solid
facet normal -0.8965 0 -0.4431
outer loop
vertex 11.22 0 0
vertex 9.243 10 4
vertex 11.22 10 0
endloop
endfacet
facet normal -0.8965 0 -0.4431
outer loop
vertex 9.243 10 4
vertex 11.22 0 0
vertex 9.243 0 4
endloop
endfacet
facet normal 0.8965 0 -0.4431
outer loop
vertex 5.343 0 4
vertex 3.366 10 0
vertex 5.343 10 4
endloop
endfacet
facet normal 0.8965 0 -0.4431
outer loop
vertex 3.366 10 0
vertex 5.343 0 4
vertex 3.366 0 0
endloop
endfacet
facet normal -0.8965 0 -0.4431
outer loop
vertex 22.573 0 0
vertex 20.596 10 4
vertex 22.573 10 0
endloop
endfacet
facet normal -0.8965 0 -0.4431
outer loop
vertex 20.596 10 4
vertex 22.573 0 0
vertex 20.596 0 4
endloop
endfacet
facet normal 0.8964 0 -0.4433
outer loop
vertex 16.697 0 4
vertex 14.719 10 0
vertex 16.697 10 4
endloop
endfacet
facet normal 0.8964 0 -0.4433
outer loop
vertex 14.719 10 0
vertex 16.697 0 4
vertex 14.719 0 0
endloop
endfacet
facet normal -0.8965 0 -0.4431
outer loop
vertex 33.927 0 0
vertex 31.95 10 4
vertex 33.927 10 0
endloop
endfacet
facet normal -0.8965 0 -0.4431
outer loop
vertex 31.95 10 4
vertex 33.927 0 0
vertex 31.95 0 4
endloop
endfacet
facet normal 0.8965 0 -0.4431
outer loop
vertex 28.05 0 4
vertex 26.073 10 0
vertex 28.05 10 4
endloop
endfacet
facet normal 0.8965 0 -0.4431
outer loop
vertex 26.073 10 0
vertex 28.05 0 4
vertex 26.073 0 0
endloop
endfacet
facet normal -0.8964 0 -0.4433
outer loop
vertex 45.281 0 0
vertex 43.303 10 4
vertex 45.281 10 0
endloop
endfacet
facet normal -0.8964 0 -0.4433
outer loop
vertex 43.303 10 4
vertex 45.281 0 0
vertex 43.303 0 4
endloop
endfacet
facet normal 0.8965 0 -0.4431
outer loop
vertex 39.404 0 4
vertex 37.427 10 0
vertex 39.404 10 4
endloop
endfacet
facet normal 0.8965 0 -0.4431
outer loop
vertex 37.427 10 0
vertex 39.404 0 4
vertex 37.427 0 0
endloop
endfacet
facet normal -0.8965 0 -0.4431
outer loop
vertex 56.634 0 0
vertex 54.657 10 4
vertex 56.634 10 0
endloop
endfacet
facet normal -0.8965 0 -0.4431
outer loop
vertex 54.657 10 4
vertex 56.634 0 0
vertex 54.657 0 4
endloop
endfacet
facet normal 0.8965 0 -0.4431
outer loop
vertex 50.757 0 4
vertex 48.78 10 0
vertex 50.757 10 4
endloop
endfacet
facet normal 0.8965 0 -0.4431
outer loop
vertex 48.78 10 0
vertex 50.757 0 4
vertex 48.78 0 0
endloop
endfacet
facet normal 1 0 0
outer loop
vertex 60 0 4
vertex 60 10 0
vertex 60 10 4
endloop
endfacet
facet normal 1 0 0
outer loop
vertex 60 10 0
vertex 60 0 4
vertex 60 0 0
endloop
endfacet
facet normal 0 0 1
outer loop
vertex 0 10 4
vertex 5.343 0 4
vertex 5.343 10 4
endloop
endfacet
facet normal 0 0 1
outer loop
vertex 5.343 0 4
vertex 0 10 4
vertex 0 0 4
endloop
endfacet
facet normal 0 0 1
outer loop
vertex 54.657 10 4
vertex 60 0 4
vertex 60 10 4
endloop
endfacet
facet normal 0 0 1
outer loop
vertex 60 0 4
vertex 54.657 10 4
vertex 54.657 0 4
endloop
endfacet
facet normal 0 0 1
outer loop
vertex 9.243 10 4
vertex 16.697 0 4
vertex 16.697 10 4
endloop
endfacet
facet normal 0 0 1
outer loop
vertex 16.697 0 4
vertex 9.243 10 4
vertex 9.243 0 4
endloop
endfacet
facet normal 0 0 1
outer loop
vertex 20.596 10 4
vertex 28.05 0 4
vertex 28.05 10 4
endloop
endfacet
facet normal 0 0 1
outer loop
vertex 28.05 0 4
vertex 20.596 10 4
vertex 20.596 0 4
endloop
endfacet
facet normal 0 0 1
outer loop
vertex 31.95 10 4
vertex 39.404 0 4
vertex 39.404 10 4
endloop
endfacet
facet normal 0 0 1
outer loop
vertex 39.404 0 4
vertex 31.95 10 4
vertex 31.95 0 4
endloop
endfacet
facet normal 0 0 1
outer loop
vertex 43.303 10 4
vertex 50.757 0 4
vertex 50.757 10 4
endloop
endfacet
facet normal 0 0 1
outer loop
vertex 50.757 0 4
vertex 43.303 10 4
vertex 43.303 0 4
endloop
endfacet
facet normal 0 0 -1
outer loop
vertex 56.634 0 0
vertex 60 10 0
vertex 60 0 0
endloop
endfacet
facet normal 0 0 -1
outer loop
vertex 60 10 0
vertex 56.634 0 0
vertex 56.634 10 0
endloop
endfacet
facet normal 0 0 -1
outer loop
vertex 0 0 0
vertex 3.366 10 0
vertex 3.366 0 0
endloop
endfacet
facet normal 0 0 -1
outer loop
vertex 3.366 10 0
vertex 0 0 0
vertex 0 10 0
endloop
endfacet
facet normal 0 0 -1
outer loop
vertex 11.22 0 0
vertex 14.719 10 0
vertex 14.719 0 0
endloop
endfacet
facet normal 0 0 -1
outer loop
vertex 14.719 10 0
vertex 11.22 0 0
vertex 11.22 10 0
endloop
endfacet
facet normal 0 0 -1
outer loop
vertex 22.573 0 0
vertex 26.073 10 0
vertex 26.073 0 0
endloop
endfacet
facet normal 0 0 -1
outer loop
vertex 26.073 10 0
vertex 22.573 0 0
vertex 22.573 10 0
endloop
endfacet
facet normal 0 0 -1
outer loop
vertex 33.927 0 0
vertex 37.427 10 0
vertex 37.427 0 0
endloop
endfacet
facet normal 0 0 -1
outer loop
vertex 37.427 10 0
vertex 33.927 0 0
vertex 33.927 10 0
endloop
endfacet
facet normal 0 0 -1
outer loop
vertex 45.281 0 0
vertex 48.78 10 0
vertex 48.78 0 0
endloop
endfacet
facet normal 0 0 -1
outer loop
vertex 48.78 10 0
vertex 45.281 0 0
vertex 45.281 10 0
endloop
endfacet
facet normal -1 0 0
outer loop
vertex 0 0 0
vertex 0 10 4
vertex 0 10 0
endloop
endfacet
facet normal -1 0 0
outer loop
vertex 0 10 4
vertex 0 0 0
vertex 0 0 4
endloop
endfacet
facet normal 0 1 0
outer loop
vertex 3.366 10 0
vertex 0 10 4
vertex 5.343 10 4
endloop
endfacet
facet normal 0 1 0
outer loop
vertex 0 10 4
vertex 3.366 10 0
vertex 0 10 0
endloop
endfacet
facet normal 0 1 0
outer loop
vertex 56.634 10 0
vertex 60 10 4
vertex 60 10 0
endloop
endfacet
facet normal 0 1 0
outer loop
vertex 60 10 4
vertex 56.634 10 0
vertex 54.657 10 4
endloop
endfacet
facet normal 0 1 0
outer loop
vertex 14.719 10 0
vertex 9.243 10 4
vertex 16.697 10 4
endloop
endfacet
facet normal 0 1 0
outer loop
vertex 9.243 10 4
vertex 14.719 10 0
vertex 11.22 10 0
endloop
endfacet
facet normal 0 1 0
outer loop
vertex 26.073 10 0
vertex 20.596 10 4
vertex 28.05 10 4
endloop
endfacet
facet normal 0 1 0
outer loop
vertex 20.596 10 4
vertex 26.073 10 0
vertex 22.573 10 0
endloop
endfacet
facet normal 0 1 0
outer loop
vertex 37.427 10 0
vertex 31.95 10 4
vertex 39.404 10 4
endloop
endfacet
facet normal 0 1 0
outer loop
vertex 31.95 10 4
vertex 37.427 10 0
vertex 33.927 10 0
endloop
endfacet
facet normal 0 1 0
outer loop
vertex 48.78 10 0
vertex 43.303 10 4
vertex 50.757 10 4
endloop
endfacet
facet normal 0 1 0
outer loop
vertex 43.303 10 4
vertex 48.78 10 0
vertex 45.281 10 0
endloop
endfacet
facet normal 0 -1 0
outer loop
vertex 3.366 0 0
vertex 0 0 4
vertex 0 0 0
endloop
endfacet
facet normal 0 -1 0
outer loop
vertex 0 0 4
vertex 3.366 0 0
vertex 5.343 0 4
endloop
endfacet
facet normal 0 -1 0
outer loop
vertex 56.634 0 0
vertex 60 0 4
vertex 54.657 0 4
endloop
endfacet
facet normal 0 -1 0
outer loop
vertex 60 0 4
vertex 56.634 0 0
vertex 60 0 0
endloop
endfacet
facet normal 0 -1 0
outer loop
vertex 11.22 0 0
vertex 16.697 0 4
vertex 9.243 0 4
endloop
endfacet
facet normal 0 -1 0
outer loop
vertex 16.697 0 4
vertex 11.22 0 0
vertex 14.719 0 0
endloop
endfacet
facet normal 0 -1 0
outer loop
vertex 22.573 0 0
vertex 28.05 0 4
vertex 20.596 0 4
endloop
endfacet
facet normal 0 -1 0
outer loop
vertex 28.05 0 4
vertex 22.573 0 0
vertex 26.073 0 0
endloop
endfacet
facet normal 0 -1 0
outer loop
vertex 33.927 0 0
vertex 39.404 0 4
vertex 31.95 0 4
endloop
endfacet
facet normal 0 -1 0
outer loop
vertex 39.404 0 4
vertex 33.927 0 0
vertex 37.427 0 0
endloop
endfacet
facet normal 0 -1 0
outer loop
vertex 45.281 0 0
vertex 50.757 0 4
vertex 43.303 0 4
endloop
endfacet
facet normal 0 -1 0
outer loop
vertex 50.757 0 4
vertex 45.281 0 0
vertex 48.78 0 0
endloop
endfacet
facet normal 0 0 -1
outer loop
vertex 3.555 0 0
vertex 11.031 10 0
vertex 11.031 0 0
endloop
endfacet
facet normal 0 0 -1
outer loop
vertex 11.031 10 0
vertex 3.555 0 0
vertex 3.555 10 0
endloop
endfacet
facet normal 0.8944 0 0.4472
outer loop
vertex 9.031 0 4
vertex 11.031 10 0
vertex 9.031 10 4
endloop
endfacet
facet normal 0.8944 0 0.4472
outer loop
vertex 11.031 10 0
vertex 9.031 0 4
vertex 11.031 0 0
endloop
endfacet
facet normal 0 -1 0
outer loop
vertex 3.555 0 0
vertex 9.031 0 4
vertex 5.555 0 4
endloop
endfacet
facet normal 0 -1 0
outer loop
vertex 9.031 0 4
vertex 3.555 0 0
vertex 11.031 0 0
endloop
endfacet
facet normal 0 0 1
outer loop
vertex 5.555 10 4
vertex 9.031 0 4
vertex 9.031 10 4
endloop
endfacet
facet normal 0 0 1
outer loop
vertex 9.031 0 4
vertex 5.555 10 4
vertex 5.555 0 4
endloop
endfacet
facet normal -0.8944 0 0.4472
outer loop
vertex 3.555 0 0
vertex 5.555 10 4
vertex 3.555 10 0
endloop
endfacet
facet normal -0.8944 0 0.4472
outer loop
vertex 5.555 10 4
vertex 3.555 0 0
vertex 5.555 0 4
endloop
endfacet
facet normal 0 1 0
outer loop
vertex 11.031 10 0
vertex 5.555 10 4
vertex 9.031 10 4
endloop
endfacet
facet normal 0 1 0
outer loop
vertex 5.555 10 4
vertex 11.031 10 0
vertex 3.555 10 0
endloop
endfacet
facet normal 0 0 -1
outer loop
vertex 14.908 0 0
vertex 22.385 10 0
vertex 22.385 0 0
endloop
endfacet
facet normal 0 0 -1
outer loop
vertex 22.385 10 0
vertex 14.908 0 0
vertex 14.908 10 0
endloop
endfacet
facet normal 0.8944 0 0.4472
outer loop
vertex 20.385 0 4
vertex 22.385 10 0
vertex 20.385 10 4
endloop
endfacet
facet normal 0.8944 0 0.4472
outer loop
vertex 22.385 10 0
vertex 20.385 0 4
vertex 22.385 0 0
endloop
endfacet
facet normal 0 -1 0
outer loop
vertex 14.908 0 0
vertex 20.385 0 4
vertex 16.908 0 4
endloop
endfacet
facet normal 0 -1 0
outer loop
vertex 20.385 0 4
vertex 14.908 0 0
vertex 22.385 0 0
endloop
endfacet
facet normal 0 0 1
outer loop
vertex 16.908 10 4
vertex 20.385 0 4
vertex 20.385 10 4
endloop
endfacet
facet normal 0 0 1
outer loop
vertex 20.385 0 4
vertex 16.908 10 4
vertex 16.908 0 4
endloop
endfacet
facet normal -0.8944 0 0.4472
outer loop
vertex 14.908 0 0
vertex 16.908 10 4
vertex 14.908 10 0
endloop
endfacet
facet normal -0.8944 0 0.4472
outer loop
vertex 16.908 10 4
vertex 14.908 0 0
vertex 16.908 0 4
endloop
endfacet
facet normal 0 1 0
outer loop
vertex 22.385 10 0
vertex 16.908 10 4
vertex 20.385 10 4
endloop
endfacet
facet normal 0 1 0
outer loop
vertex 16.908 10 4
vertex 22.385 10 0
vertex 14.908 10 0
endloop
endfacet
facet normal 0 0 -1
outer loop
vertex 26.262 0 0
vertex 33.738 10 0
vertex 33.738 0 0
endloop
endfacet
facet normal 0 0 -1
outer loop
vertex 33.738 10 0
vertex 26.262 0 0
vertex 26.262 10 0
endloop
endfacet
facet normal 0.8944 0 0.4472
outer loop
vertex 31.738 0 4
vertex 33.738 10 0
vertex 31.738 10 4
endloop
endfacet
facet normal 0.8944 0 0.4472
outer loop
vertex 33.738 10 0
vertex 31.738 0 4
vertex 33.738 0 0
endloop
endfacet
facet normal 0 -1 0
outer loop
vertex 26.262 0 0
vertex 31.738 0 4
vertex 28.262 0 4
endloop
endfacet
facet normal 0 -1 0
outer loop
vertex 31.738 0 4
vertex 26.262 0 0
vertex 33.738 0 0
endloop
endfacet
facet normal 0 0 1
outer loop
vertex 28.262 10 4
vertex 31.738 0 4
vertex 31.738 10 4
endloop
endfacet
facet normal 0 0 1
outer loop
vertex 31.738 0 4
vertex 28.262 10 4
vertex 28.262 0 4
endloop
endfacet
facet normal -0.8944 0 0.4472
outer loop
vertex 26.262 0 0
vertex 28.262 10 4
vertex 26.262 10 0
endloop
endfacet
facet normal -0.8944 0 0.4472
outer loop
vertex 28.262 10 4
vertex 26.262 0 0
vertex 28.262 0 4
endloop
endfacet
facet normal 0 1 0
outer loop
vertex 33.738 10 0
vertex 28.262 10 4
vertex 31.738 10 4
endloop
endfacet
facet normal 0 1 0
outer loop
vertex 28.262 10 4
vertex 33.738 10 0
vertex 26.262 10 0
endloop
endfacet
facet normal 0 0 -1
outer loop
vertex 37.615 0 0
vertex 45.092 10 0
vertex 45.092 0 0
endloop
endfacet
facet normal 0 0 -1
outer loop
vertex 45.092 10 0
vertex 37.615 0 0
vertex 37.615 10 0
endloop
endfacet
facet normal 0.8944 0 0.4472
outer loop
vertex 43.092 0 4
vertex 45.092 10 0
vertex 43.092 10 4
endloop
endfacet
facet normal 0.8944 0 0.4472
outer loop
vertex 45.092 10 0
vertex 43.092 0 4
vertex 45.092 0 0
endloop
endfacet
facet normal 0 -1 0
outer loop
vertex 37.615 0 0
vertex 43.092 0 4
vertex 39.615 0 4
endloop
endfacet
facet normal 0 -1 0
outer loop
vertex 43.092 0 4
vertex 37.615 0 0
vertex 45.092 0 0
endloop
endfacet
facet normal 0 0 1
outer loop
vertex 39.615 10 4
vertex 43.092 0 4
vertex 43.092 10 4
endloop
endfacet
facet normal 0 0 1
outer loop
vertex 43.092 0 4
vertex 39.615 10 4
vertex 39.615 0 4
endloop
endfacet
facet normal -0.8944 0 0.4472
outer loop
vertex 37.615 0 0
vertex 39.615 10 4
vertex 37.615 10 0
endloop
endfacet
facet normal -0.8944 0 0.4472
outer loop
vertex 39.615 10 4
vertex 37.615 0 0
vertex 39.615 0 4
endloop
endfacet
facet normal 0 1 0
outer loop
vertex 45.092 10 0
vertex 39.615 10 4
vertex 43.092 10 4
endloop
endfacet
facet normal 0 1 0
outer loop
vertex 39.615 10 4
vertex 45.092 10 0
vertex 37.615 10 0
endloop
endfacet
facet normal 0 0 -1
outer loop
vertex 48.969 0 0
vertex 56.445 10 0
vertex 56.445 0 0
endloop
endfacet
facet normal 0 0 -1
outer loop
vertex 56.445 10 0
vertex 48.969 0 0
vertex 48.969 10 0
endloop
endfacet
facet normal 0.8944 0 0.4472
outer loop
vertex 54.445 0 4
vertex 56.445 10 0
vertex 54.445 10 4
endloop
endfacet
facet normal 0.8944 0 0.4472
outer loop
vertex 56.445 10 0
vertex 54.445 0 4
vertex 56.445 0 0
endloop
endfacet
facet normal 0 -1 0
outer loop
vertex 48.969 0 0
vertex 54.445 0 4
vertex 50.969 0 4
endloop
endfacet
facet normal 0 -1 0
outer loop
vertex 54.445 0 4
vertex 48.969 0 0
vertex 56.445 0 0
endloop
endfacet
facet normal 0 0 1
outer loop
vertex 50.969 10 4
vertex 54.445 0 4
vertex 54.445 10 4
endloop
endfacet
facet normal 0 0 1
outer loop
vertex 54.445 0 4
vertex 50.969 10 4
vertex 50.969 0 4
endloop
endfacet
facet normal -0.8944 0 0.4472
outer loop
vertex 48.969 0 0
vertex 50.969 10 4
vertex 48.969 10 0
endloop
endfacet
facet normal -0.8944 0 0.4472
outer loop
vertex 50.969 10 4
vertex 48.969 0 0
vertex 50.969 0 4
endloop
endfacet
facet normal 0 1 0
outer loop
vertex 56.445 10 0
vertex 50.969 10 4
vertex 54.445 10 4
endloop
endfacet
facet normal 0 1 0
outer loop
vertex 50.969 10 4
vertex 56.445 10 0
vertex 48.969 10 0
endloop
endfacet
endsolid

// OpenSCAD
// file: basic_shapes.scad
include <values.scad>;

module hole_array(xs, diameter, height, y = 0, z = 0, square = false) {
    for (x = xs) {
        translate([x, y, z]) {
            if (square) {
                translate([diameter / -2, diameter / -2, 0]) {
                    cube([diameter, diameter, height]);
                }
            } else {
                cylinder(d = diameter, h = height);
            }
        }
    }
}

module spacer_array(
    positions,
    height,
    wall = 2,
    hole_diameter = PCB_MOUNT_HOLE_DIAMETER,
    z = 0,
    $fn = DEFAULT_ROUNDING
) {
    for (position = positions) {
        translate([position.x, position.y, z]) {
            ring(
                diameter = hole_diameter + wall * 2,
                inner_diameter = hole_diameter,
                height = height
            );
        }
    }
}

module flat_top_rectangular_pyramid(
    top_width = 0,
    top_length = 0,

    bottom_width = 0,
    bottom_length = 0,

    height = 0,

    top_x = undef,
    top_y = undef,

    top_weight_x = .5,
    top_weight_y = .5
) {
    top_x = top_x != undef
        ? top_x
        : (bottom_width - top_width) * top_weight_x;
    top_y = top_y != undef
        ? top_y
        : (bottom_length - top_length) * top_weight_y;

    max_difference = max(bottom_width - top_width, bottom_length - top_length);
    height = height == undef
        ? max_difference / 2
        : height;

    polyhedron(
        [
            [0, 0, 0],
            [bottom_width, 0, 0],
            [bottom_width, bottom_length, 0],
            [0, bottom_length, 0],
            [top_x, top_y, height],
            [top_width + top_x, top_y, height],
            [top_width + top_x, top_length + top_y, height],
            [top_x, top_length + top_y, height]
        ], [
            [0, 1, 2, 3],
            [4, 5, 1, 0],
            [7, 6, 5, 4],
            [5, 6, 2, 1],
            [6, 7, 3, 2],
            [7, 4, 0, 3]
        ]
    );
}

module rounded_cube(dimensions, radius, $fn = $fn) {
    positions = [
        [radius, radius, radius],
        [dimensions.x - radius, radius, radius],
        [dimensions.x - radius, dimensions.y - radius, radius],
        [radius, dimensions.y - radius, radius],
        [radius, radius, dimensions.z - radius],
        [dimensions.x - radius, radius, dimensions.z - radius],
        [dimensions.x - radius, dimensions.y - radius, dimensions.z - radius],
        [radius, dimensions.y - radius, dimensions.z - radius],
    ];

    if (radius > 0) {
        hull() {
            for (position = positions) {
                translate(position) sphere(r = radius);
            }
        }
    } else {
        cube(dimensions);
    }
}

module support_wall(
    dimensions,
    is_back = true,
    railing_diameter = 3.5,
    support_width = 2,
    support_length = 4,
    gutter = 4
) {
    railing_z = railing_diameter / 4;

    module _support(height = dimensions[2], depth = support_length) {
        translate([0, -depth, 0]) {
            flat_top_rectangular_pyramid(
                top_width = support_width,
                top_length = 0,
                bottom_width = support_width,
                bottom_length = support_length,
                height = height,
                top_weight_y = 1
            );
        }
    }

    translate(is_back ? [0, dimensions[1], 0] : [0, 0, 0]) {
        mirror(is_back ? [0, 1, 0] : [0, 0, 0]) {
            cube(dimensions);

            translate([0, dimensions[1] / 2, dimensions[2] + railing_z]) {
                rotate([0, 90, 0]) {
                    cylinder(
                        d = railing_diameter,
                        h = dimensions[0],
                        $fn = 9
                    );
                }
            }

            translate([gutter, 0, 0]) {
                _support();
            }
            translate([dimensions[0] - support_length - gutter, 0, 0]) {
                _support();
            }
        }
    }
}

module ring(
    diameter,
    height,
    thickness, inner_diameter = 0
) {
    e = 0.034;
    thickness = thickness != undef
        ? thickness
        : (diameter - inner_diameter) / 2;

    difference() {
        cylinder(d = diameter, h = height);

        translate([0, 0, -e]) {
            cylinder(d = diameter - thickness * 2, h = height + e * 2);
        }
    }
}

module cylinder_grip(
    diameter,
    height,
    count,
    rotation_offset = 0,
    size = 1,
    $fn = undef
) {
    if (size > 0) {
        count = count != undef
            ? count
            : floor((diameter * PI) / size / 2);

        for (i = [0 : count - 1]) {
            rotate([0, 0, rotation_offset + 360 * i / count]) {
                translate([0, diameter / 2, 0]) {
                    cylinder(d = size, h = height);
                }
            }
        }
    }
}

module rounded_corner_cutoff(height, radius, angle = 0, e = 1.123, $fn = $fn) {
    difference() {
        rotate([0, 0, angle]) {
            cube([radius + e, radius + e, height]);
        }

        translate([0, 0, -e]) {
            cylinder(r = radius, h = height + e * 2);
        }
    }
}

rounded_corner_cutoff(height = 15, radius = 5);
// file: values.scad
DEFAULT_ROUNDING = 24;
HIDEF_ROUNDING = 120;

SACRIFICIAL_BRIDGE_HEIGHT = .2;
BREAKAWAY_SUPPORT_DEPTH = .5;
BREAKAWAY_SUPPORT_GUTTER = 1;
BREAKAWAY_SUPPORT_DISTANCE = 10;

PCB_WIDTH = 183.954;
PCB_LENGTH = 114.808;
PCB_HEIGHT = 1.6;
PCB_MOUNT_HOLE_DIAMETER = 3.2;

PCB_BATTERY_CAVITY_X = 135.382;
PCB_BATTERY_CAVITY_Y = 48.768;
PCB_BATTERY_CAVITY_LENGTH = PCB_LENGTH - PCB_BATTERY_CAVITY_Y + 1;

PCB_COMPONENTS_X = 2.54;
PCB_COMPONENTS_Y = 28.448;
PCB_COMPONENTS_WIDTH = PCB_BATTERY_CAVITY_X - PCB_COMPONENTS_X - 2.54 * 2;
PCB_COMPONENTS_LENGTH = PCB_LENGTH - PCB_COMPONENTS_Y - 2.54;
PCB_COMPONENTS_HEIGHT = 12;

PCB_SWITCH_X = 168.402;
PCB_SWITCH_Y = 8.636;

PCB_LED_X = 160.02 - 2.54 / 2;
PCB_LED_Y = 31.242;

PCB_VOLUME_WHEEL_X = 182.118 - 2.54;
PCB_VOLUME_WHEEL_Y = 34.29 + 2.54;

BUTTON_DIAMETER = 6;
BUTTON_LENGTH = 6.6;
BUTTON_WIDTH = 4.5;
BUTTON_HEIGHT = 6;

POT_HEIGHT = 7.8;

BOTTOM_MOUNTED_PCB_HOLES = [
    [175.804, 22.606],
    [8.164, 22.606],
    [64.044, 22.606],
    [119.924, 22.606],
];

BACK_PCB_HOLES = [
    [26.416, 92.964],
    [108.712, 92.964],
];

WIRE_RELIEF_HOLES = [
    [172.466, 44.704],
    [164.338, 44.704],
];

PCB_HOLES = concat(
    BOTTOM_MOUNTED_PCB_HOLES,
    BACK_PCB_HOLES,
    WIRE_RELIEF_HOLES
);

PCB_BUTTONS = [
    [10.414, 8.89 - BUTTON_LENGTH],
    [18.034, 13.97 - BUTTON_LENGTH],
    [25.654, 8.89 - BUTTON_LENGTH],
    [33.274, 13.97 - BUTTON_LENGTH],
    [40.894, 8.89 - BUTTON_LENGTH],
    [48.514, 13.97 - BUTTON_LENGTH],
    [56.134, 8.89 - BUTTON_LENGTH],
    [71.374, 8.89 - BUTTON_LENGTH],
    [78.994, 13.97 - BUTTON_LENGTH],
    [86.614, 8.89 - BUTTON_LENGTH],
    [94.234, 13.97 - BUTTON_LENGTH],
    [101.854, 8.89 - BUTTON_LENGTH],
    [117.094, 8.89 - BUTTON_LENGTH],
    [124.714, 13.97 - BUTTON_LENGTH],
    [132.334, 8.89 - BUTTON_LENGTH],
    [139.954, 13.97 - BUTTON_LENGTH],
    [147.574, 8.89 - BUTTON_LENGTH],
    [155.194, 13.97 - BUTTON_LENGTH],
    [162.814, 8.89 - BUTTON_LENGTH],
    [178.054, 8.89 - BUTTON_LENGTH],
];

SCREW_HEAD_DIAMETER = 6;
SCREW_HEAD_HEIGHT = 2.1;
NUT_DIAMETER = 6.4;
NUT_HEIGHT = 2.4;

DEFAULT_NUT_LOCK_HEIGHT_CLEARANCE = .1;
DEFAULT_NUT_LOCK_DIAMETER_CLEARANCE = .1;

MOUNT_STILT_MINIMUM_HEIGHT = NUT_HEIGHT + .5 + 2; // TODO: tidy against mount_stilt args

NATURAL_KEY_SEQUENCES = [
    [1,0,1,0,1,1,0,1,0,1,0,1,],
    [0,1,0,1,1,0,1,0,1,0,1,1,],
    [1,0,1,1,0,1,0,1,0,1,1,0,],
    [0,1,1,0,1,0,1,0,1,1,0,1,],
    [1,1,0,1,0,1,0,1,1,0,1,0,],
    [1,0,1,0,1,0,1,1,0,1,0,1,],
    [0,1,0,1,0,1,1,0,1,0,1,1,],
    [1,0,1,0,1,1,0,1,0,1,1,0,],
    [0,1,0,1,1,0,1,0,1,1,0,1,],
    [1,0,1,1,0,1,0,1,1,0,1,0,],
    [0,1,1,0,1,0,1,1,0,1,0,1,],
    [1,1,0,1,0,1,1,0,1,0,1,0,],
];

HINGE_CLASP_DEFAULT_PIN_DIAMETER = 1.75; // filament diameter
HINGE_CLASP_DEFAULT_MINIMAL_SUPPORT = 1.5;
HINGE_CLASP_MINIMUM_TOOTH_WIDTH = 5;
HINGE_CLASP_MINIMUM_TOOTH_COUNT = 5;
HINGE_CLASP_MINIMUM_WIDTH = HINGE_CLASP_MINIMUM_TOOTH_WIDTH
    * HINGE_CLASP_MINIMUM_TOOTH_COUNT;
MINIMUM_HINGE_CLASP_LENGTH = 20;

HINGE_CLASP_SIDE_FRONT_BACK = 0;
HINGE_CLASP_SIDE_LEFT_RIGHT = 1;

LIP_BOX_DEFAULT_LIP_HEIGHT = 3;

BATTERY_WIDTH = 48.6;
BATTERY_LENGTH = 25.8;
BATTERY_HEIGHT = 17.1;
BATTERY_SNAP_WIDTH = 4.2;

/* S20X35VFS */
SPEAKER_DIAMETER = 41.1;
SPEAKER_HEIGHT = 23.5;
SPEAKER_LENGTH = 71;
SPEAKER_CLEARANCE = 2;
SPEAKER_PLATE_HOLE_DIAMETER = 3.6;
SPEAKER_PLATE_HOLE_XY = 4;
SPEAKER_PLATE_HEIGHT = .8;
SPEAKER_RIM_DEPTH = 3.8;
SPEAKER_RIM_HEIGHT = 1.4 - .4; // explicitly undersizing for good fit
SPEAKER_CONE_DIAMETER = 38;
SPEAKER_MAGNET_DIAMETER = 22;
SPEAKER_MAGNET_HEIGHT = 7.5;

/* https://www.ckswitches.com/media/1428/os.pdf */
SWITCH_BASE_WIDTH = 4.4;
SWITCH_BASE_LENGTH = 8.7;
SWITCH_BASE_HEIGHT = 4.5;
SWITCH_ACTUATOR_WIDTH = 2;
SWITCH_ACTUATOR_LENGTH = 2.1;
SWITCH_ACTUATOR_HEIGHT = 3.8;
SWITCH_ACTUATOR_TRAVEL = 1.5;
SWITCH_ORIGIN = [SWITCH_BASE_WIDTH / 2, 6.36];

LED_DIAMETER = 5.9;
LED_HEIGHT = 8.6;

PENCIL_STAND_CAVITY_DIAMETER = 8.5;

PLASTICS_TOLERANCE = 1.524; // https://www.tapplastics.com/product/plastics/cut_to_size_plastic
WINDOW_PANE_HEIGHT = 25.4 * 1 / 8;

HITCH_DEFAULT_MOUNT_SCREW_HEAD_CLEARANCE = .1;
HITCH_DEFAULT_SCREW_FLOOR = .4;
HITCH_RECOMMENDED_MINIMUM_CAVITY_HEIGHT = SCREW_HEAD_HEIGHT
    + HITCH_DEFAULT_MOUNT_SCREW_HEAD_CLEARANCE
    + HITCH_DEFAULT_SCREW_FLOOR
    + (SCREW_HEAD_DIAMETER - PCB_MOUNT_HOLE_DIAMETER) / 2;

TRIMPOT_KNOB_HEAD_DIAMETER = 6.15;
TRIMPOT_KNOB_HEAD_HEIGHT = 1.5;

HITCH_HEAD_LENGTH = 10;
HITCH_HEAD_HEIGHT = 2;
HITCH_WALL_LENGTH = 6;
HITCH_HEIGHT = 10;
HITCH_DOVETAIL_HEIGHT = 3;
HITCH_DOVETAIL_WALL = .8;
// main file
include <values.scad>;

use <basic_shapes.scad>;

module dovetails(
    dimensions = [],
    show_base = false,
    show_insert = false,
    invert = false,
    tolerance = .1
) {
    width = dimensions[0];
    length = dimensions[1];
    height = dimensions[2];

    e = .023;

    MINIMUM_TAB_WIDTH = 5;

    _tab_count = floor(width / MINIMUM_TAB_WIDTH) - 2;
    tab_count = _tab_count % 1 == 0 ? _tab_count - 1 : _tab_count;

    depth = height * (invert ? -1 : 1);

    end_width = width / (tab_count + 2) - depth / 4;
    tab_width = (width - end_width * 2) / tab_count;

    module _tabs(width = tab_width, length = length, height = height) {
        for (i = [0 : tab_count - 1]) {
            x = end_width + i * tab_width - depth / 4 + (tab_width - width) / 2;

            if (i % 2 == 0) {
                translate([x, 0, 0]) {
                    flat_top_rectangular_pyramid(
                        top_width = width - depth / 2,
                        top_length = length,
                        bottom_width = width + depth / 2,
                        bottom_length = length,
                        height = height
                    );
                }
            }
        }
    }

    if (show_insert) {
        _tabs(width = tab_width - tolerance * 2);
    }

    if (show_base) {
        difference() {
            cube([width, length, height]);

            translate([0, -e, -e]) {
                _tabs(
                    width = tab_width + tolerance * 2,
                    length = length + e * 2,
                    height = height + e * 2
                );
            }
        }
    }
}

dovetails([60, 10, 4], show_base = true);
# dovetails([60, 10, 4], show_insert = true);
